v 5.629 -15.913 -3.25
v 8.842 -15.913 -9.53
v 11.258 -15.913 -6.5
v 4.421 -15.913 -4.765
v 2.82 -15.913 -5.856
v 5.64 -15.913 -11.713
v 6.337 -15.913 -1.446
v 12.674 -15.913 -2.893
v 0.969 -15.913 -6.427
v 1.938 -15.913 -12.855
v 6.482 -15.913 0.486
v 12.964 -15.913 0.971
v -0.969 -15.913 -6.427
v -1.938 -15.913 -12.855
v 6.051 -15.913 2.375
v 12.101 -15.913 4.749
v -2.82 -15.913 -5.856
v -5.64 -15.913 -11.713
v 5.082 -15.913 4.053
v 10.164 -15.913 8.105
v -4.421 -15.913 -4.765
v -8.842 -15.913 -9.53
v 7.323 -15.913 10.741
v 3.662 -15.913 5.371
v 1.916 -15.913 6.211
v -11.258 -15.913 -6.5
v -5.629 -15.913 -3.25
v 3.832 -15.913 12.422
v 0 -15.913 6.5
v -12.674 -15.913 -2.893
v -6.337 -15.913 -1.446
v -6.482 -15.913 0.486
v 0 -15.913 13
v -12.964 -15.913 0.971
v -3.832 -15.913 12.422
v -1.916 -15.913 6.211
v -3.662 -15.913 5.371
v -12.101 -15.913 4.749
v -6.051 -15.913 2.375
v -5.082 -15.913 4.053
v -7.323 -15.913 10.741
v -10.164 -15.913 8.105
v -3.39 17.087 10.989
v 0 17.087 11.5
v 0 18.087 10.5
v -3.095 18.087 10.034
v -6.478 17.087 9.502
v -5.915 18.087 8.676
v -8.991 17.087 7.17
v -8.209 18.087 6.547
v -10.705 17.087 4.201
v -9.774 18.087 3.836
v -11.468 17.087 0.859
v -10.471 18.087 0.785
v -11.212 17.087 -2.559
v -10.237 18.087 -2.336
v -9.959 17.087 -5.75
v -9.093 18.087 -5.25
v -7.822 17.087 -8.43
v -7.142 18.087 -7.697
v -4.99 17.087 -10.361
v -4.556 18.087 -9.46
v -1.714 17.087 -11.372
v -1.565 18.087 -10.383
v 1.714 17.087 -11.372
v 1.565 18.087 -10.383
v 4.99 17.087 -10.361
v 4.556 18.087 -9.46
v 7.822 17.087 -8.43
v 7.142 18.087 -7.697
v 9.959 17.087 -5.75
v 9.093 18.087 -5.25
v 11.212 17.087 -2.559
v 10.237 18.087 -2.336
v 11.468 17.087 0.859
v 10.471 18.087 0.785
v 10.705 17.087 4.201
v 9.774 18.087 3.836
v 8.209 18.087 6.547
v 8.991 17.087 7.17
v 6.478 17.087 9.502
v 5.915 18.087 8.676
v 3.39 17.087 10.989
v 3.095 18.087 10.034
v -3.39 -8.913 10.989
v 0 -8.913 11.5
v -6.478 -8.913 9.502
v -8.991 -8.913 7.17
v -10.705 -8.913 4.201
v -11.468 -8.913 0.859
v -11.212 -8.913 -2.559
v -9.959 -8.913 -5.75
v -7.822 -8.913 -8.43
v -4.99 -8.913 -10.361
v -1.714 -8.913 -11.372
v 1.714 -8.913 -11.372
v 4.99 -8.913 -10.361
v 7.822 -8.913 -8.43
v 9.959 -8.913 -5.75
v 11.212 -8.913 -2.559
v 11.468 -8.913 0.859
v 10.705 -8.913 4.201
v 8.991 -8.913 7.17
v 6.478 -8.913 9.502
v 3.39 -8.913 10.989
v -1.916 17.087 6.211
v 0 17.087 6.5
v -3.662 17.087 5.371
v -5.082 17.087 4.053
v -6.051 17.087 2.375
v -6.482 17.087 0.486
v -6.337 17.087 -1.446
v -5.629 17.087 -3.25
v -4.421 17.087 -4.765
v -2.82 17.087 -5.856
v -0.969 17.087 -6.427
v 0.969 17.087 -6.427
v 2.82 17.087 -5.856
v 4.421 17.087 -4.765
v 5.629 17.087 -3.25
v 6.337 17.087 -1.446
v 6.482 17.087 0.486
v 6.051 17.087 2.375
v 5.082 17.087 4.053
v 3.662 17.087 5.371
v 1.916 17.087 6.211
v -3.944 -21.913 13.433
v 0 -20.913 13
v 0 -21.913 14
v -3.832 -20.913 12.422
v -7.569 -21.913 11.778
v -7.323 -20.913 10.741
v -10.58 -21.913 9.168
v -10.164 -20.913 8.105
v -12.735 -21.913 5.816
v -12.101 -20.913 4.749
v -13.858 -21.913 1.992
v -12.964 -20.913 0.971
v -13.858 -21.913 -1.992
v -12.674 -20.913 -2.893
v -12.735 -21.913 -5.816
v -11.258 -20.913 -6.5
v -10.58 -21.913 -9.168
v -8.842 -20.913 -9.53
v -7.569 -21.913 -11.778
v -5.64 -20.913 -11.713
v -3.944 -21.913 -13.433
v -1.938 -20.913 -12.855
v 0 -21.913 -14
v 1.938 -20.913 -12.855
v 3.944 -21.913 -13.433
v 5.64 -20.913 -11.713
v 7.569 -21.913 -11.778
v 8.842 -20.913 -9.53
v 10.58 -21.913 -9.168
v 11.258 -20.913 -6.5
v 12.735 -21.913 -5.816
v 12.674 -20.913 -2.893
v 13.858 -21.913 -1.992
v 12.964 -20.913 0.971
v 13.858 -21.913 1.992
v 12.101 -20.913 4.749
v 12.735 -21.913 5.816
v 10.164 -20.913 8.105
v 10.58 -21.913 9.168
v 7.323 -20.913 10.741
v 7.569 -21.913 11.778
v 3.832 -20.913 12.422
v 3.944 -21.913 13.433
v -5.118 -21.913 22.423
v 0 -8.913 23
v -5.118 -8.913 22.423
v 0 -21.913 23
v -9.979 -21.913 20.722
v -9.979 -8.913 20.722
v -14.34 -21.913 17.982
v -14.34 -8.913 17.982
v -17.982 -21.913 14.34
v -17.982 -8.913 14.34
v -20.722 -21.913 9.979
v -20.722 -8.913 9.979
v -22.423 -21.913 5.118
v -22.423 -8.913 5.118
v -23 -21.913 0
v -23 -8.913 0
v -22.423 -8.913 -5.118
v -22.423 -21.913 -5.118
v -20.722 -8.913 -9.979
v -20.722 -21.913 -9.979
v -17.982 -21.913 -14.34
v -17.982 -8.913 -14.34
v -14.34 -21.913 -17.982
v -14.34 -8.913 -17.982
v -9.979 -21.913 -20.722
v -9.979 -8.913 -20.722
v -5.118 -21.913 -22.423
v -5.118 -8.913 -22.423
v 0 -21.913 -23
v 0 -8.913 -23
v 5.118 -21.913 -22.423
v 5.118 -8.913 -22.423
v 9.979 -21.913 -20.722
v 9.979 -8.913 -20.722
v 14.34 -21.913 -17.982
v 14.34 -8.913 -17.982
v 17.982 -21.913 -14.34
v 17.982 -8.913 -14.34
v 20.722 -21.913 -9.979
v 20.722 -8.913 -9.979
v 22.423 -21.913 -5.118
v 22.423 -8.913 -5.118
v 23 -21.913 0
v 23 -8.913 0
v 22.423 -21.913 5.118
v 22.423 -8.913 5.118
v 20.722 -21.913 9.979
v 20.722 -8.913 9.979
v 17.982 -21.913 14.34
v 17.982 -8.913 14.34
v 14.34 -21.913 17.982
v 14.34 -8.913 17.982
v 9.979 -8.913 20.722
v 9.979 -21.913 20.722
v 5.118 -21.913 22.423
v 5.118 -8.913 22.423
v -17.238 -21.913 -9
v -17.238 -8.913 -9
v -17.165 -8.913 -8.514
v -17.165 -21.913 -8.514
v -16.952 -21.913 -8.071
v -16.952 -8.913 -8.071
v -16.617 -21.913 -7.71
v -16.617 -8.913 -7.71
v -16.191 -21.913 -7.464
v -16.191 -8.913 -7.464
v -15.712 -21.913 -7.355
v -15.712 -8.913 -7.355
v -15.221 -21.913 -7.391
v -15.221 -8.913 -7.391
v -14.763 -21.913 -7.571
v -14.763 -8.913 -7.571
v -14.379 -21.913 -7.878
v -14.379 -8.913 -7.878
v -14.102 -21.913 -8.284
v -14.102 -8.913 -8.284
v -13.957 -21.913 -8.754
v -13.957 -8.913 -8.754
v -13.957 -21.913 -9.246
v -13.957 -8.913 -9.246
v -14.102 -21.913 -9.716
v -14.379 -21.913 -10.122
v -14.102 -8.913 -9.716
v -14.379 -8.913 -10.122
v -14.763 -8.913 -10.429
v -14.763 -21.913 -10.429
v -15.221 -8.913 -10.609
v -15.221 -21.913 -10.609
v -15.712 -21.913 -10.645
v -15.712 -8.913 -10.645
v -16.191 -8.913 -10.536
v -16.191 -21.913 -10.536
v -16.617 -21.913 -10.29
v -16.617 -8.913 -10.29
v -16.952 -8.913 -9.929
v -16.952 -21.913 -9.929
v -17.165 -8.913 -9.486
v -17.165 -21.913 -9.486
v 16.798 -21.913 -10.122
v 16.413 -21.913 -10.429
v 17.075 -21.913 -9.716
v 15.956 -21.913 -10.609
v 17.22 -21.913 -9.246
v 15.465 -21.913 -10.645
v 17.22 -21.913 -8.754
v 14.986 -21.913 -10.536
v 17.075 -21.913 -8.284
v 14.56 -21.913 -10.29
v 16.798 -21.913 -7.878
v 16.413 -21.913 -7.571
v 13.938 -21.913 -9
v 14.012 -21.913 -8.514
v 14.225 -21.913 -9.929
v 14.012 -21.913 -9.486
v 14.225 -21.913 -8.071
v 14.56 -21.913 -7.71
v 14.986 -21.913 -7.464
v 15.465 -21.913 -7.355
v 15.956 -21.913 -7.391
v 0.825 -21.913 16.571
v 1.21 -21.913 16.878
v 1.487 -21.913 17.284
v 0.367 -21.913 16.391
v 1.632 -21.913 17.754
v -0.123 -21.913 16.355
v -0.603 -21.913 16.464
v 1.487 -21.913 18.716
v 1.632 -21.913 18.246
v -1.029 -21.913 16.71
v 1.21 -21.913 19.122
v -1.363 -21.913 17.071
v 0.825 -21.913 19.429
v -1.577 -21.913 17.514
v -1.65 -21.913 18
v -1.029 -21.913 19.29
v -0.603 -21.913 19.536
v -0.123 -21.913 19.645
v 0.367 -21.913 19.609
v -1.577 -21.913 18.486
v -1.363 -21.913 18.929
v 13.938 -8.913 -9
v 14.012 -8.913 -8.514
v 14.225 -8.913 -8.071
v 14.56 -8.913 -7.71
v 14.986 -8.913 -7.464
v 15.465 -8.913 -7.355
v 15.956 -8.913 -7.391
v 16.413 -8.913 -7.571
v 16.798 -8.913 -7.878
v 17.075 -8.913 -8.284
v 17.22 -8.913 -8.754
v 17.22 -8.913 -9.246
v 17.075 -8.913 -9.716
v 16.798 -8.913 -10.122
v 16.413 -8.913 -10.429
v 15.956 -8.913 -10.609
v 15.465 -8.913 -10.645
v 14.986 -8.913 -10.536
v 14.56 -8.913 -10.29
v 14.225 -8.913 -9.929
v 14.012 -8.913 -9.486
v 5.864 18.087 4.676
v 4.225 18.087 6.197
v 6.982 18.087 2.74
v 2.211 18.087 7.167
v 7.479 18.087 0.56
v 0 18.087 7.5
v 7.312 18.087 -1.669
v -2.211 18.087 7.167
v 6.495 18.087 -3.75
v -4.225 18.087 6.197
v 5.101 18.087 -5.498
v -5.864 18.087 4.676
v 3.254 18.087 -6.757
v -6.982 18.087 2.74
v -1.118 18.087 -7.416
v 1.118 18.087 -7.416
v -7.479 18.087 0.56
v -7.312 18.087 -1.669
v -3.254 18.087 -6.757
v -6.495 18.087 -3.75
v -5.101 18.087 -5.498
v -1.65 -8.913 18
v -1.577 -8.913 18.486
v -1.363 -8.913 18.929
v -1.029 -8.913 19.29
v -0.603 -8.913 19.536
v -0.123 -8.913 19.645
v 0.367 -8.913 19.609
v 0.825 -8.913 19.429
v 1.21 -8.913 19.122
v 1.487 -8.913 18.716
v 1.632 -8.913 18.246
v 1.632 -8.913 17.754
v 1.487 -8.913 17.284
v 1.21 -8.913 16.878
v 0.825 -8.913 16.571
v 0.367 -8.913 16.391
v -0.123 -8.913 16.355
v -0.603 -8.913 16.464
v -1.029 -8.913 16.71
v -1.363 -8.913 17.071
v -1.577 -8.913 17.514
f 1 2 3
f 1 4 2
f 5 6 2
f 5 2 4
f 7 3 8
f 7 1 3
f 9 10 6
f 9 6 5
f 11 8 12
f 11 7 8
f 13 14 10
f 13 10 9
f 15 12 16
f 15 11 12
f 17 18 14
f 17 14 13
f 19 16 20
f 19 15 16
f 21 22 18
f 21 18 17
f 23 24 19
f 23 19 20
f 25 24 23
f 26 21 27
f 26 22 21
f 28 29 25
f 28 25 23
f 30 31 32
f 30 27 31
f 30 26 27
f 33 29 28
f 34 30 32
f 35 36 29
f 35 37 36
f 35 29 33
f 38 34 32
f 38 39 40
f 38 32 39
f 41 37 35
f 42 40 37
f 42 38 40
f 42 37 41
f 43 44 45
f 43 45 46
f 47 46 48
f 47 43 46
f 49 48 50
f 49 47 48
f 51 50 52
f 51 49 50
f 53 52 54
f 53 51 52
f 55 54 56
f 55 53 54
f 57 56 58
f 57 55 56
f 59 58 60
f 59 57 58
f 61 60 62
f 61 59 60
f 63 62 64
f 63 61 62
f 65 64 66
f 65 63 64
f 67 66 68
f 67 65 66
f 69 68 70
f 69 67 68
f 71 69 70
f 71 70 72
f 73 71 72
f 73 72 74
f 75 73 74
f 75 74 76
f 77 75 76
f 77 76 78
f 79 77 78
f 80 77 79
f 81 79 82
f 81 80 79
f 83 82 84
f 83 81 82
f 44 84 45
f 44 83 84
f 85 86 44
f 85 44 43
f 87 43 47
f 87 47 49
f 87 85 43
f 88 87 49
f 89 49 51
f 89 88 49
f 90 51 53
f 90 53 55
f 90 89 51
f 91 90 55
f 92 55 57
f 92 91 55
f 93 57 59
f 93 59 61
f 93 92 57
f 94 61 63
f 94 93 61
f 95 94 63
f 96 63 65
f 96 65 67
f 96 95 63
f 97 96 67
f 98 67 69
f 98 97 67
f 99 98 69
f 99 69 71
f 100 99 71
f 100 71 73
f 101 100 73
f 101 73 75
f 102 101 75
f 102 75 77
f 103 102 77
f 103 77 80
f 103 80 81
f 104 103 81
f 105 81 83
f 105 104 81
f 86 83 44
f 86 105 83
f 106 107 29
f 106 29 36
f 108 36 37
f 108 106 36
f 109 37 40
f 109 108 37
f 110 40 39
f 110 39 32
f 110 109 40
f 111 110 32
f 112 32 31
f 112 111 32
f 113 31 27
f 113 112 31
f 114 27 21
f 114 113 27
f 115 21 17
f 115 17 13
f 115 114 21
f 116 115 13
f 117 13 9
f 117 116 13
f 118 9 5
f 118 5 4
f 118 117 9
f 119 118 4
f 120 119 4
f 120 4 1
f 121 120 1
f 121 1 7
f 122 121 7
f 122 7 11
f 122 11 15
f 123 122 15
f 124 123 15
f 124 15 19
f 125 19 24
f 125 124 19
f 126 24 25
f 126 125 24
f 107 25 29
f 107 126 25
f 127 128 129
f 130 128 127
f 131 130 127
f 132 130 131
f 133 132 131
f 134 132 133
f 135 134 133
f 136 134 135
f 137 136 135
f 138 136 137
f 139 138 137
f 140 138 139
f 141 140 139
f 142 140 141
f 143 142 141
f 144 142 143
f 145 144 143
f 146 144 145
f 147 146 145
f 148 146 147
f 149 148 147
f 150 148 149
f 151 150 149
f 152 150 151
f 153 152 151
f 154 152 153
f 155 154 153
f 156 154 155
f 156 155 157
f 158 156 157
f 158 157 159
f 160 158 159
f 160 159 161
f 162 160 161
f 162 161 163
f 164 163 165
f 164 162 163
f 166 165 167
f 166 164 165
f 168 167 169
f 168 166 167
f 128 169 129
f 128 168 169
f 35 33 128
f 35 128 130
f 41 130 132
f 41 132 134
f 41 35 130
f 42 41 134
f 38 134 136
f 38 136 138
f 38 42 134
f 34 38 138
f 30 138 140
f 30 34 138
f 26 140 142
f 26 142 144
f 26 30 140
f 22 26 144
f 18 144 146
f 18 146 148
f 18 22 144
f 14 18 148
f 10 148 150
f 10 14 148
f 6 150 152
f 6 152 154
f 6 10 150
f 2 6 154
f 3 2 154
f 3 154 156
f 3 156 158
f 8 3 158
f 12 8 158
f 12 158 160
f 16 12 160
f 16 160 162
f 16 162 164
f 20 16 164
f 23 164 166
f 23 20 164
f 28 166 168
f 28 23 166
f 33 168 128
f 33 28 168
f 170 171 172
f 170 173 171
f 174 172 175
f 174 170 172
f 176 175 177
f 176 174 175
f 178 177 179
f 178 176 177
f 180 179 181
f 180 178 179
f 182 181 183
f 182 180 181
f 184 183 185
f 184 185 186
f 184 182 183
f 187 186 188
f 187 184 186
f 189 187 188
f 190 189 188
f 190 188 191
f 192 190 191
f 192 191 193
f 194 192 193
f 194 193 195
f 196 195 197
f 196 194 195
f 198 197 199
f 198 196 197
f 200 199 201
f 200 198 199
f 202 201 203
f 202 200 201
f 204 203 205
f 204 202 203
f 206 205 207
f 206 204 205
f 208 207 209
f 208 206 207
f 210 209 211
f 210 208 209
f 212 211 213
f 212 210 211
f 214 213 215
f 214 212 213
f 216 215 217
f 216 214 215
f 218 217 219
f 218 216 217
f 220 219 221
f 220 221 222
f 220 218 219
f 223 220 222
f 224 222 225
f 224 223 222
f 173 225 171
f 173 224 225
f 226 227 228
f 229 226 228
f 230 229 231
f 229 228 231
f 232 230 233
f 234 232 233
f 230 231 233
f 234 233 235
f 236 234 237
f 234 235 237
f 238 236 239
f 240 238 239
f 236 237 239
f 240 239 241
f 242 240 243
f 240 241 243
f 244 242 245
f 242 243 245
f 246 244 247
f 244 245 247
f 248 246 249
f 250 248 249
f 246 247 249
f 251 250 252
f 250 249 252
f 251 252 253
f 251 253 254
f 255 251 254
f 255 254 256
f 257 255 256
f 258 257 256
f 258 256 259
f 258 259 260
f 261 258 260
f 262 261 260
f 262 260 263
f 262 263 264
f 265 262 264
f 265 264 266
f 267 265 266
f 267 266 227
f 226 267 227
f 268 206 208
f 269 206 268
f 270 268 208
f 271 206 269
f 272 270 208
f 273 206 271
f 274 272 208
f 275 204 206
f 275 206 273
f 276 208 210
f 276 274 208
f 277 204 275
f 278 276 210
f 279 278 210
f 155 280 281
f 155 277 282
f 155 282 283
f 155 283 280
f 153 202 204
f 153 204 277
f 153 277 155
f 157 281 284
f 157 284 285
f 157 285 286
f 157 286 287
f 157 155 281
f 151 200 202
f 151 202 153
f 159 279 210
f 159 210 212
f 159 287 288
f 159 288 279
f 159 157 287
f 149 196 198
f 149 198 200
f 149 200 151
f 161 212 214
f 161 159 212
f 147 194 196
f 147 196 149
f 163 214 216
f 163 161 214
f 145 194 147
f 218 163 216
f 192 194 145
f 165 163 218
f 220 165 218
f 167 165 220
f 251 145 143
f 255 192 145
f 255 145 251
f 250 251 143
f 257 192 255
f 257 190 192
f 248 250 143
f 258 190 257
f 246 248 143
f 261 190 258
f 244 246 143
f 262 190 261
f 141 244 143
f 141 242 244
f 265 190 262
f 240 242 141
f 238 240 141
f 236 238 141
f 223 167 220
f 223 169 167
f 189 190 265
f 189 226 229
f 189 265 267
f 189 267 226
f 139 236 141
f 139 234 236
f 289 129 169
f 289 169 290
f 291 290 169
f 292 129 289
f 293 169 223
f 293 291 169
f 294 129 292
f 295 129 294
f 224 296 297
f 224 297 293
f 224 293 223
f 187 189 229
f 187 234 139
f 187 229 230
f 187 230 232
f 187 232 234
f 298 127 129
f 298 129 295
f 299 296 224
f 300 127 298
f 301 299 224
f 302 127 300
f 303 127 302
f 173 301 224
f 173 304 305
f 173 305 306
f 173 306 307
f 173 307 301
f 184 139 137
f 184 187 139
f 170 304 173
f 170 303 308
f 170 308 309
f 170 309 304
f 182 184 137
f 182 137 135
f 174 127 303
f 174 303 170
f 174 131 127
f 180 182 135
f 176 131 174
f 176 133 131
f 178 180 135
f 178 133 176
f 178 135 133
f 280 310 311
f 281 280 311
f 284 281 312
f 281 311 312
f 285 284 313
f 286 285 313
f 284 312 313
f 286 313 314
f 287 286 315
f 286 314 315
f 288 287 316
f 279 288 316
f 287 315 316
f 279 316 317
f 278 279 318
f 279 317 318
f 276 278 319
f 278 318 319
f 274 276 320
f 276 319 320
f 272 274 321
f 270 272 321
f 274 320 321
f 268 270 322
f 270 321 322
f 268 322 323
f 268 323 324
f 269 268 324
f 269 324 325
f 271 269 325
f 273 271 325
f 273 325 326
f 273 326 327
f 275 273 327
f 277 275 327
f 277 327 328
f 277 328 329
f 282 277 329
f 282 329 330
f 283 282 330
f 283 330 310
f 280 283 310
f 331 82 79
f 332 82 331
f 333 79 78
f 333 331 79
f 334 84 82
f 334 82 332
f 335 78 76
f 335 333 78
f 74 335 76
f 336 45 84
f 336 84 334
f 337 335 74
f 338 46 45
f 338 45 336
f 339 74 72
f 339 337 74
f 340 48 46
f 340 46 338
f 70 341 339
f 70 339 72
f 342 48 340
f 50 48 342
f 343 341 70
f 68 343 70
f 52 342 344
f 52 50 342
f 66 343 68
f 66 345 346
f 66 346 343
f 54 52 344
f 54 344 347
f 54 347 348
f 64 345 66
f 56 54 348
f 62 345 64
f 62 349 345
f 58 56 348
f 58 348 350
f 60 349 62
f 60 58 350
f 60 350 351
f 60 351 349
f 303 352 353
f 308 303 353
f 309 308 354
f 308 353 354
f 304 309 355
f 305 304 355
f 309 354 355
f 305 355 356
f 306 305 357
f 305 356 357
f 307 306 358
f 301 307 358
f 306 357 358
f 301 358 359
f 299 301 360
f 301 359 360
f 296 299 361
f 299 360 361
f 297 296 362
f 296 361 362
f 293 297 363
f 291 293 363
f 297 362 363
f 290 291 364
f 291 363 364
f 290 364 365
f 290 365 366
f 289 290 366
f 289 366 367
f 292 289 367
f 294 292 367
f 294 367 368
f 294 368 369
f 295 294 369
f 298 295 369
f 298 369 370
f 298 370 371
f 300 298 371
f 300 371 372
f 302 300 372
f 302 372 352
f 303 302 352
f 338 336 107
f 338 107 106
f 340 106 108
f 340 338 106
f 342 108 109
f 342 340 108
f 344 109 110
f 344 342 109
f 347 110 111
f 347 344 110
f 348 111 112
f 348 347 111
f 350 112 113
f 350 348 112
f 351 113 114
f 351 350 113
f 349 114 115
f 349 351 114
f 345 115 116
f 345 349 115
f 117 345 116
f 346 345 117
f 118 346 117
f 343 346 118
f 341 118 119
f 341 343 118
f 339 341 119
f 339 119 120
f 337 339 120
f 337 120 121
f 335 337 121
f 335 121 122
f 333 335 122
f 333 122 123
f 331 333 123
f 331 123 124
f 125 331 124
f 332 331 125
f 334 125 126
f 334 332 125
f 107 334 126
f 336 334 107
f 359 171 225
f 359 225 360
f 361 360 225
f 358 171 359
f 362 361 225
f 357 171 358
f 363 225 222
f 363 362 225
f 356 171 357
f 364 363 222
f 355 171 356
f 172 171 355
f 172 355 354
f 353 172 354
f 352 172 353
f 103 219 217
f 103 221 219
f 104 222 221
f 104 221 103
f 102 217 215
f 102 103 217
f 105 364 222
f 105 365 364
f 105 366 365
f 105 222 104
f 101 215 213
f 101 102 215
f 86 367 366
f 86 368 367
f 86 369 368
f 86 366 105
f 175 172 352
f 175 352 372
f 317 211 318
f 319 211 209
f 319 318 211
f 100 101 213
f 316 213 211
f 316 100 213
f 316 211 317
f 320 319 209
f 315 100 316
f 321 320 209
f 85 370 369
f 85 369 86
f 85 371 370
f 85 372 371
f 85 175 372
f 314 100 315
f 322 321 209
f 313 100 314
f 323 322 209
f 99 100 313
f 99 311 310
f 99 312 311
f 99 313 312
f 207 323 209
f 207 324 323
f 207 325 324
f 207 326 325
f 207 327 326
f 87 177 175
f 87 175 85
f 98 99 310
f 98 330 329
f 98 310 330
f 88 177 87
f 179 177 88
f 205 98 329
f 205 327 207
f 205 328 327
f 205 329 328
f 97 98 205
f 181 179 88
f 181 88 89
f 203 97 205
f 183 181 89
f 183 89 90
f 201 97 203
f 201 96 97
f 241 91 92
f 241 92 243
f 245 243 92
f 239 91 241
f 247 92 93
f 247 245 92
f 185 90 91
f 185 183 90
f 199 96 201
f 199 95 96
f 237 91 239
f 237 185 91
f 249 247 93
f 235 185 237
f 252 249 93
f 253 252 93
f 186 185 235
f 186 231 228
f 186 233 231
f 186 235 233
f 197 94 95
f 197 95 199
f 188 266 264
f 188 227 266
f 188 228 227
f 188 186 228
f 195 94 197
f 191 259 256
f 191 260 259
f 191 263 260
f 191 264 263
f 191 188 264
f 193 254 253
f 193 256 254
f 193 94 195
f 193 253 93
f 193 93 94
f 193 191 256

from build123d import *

# Parameters (mm, degrees)
F2_SIZE = 1
F4_D    = 3.3


with BuildPart() as f1:
    # F0 (on Right) → F1 (revolve)
    with BuildSketch(Plane.YZ):
        Polygon((-15.9130460173, 6.5), (18.0869539827, 6.5), (18.0869539827, 11.5), (-8.9130460173, 11.5), (-8.9130460173, 23), (-21.9130460173, 23), (-21.9130460173, 13), (-15.9130460173, 13), align=None)
    revolve(axis=Axis((0, -2.1911122165, 0), (0, -1, 0)))

    # F2
    f2_edges = [f1.edges().sort_by_distance(p)[0] for p in [
        (0, 18.086954, -11.5),
        (0, 18.086954, -6.5),
        (0, -21.913046, -13),
    ]]
    chamfer(f2_edges, length=F2_SIZE)

    # F4 (through all)
    with Locations(Plane.XZ.offset(21.9130460173)):
        with Locations((0, 18), (-15.5884572681, -9), (15.5884572681, -9)):
            Hole(F4_D / 2)


solid = f1.part
